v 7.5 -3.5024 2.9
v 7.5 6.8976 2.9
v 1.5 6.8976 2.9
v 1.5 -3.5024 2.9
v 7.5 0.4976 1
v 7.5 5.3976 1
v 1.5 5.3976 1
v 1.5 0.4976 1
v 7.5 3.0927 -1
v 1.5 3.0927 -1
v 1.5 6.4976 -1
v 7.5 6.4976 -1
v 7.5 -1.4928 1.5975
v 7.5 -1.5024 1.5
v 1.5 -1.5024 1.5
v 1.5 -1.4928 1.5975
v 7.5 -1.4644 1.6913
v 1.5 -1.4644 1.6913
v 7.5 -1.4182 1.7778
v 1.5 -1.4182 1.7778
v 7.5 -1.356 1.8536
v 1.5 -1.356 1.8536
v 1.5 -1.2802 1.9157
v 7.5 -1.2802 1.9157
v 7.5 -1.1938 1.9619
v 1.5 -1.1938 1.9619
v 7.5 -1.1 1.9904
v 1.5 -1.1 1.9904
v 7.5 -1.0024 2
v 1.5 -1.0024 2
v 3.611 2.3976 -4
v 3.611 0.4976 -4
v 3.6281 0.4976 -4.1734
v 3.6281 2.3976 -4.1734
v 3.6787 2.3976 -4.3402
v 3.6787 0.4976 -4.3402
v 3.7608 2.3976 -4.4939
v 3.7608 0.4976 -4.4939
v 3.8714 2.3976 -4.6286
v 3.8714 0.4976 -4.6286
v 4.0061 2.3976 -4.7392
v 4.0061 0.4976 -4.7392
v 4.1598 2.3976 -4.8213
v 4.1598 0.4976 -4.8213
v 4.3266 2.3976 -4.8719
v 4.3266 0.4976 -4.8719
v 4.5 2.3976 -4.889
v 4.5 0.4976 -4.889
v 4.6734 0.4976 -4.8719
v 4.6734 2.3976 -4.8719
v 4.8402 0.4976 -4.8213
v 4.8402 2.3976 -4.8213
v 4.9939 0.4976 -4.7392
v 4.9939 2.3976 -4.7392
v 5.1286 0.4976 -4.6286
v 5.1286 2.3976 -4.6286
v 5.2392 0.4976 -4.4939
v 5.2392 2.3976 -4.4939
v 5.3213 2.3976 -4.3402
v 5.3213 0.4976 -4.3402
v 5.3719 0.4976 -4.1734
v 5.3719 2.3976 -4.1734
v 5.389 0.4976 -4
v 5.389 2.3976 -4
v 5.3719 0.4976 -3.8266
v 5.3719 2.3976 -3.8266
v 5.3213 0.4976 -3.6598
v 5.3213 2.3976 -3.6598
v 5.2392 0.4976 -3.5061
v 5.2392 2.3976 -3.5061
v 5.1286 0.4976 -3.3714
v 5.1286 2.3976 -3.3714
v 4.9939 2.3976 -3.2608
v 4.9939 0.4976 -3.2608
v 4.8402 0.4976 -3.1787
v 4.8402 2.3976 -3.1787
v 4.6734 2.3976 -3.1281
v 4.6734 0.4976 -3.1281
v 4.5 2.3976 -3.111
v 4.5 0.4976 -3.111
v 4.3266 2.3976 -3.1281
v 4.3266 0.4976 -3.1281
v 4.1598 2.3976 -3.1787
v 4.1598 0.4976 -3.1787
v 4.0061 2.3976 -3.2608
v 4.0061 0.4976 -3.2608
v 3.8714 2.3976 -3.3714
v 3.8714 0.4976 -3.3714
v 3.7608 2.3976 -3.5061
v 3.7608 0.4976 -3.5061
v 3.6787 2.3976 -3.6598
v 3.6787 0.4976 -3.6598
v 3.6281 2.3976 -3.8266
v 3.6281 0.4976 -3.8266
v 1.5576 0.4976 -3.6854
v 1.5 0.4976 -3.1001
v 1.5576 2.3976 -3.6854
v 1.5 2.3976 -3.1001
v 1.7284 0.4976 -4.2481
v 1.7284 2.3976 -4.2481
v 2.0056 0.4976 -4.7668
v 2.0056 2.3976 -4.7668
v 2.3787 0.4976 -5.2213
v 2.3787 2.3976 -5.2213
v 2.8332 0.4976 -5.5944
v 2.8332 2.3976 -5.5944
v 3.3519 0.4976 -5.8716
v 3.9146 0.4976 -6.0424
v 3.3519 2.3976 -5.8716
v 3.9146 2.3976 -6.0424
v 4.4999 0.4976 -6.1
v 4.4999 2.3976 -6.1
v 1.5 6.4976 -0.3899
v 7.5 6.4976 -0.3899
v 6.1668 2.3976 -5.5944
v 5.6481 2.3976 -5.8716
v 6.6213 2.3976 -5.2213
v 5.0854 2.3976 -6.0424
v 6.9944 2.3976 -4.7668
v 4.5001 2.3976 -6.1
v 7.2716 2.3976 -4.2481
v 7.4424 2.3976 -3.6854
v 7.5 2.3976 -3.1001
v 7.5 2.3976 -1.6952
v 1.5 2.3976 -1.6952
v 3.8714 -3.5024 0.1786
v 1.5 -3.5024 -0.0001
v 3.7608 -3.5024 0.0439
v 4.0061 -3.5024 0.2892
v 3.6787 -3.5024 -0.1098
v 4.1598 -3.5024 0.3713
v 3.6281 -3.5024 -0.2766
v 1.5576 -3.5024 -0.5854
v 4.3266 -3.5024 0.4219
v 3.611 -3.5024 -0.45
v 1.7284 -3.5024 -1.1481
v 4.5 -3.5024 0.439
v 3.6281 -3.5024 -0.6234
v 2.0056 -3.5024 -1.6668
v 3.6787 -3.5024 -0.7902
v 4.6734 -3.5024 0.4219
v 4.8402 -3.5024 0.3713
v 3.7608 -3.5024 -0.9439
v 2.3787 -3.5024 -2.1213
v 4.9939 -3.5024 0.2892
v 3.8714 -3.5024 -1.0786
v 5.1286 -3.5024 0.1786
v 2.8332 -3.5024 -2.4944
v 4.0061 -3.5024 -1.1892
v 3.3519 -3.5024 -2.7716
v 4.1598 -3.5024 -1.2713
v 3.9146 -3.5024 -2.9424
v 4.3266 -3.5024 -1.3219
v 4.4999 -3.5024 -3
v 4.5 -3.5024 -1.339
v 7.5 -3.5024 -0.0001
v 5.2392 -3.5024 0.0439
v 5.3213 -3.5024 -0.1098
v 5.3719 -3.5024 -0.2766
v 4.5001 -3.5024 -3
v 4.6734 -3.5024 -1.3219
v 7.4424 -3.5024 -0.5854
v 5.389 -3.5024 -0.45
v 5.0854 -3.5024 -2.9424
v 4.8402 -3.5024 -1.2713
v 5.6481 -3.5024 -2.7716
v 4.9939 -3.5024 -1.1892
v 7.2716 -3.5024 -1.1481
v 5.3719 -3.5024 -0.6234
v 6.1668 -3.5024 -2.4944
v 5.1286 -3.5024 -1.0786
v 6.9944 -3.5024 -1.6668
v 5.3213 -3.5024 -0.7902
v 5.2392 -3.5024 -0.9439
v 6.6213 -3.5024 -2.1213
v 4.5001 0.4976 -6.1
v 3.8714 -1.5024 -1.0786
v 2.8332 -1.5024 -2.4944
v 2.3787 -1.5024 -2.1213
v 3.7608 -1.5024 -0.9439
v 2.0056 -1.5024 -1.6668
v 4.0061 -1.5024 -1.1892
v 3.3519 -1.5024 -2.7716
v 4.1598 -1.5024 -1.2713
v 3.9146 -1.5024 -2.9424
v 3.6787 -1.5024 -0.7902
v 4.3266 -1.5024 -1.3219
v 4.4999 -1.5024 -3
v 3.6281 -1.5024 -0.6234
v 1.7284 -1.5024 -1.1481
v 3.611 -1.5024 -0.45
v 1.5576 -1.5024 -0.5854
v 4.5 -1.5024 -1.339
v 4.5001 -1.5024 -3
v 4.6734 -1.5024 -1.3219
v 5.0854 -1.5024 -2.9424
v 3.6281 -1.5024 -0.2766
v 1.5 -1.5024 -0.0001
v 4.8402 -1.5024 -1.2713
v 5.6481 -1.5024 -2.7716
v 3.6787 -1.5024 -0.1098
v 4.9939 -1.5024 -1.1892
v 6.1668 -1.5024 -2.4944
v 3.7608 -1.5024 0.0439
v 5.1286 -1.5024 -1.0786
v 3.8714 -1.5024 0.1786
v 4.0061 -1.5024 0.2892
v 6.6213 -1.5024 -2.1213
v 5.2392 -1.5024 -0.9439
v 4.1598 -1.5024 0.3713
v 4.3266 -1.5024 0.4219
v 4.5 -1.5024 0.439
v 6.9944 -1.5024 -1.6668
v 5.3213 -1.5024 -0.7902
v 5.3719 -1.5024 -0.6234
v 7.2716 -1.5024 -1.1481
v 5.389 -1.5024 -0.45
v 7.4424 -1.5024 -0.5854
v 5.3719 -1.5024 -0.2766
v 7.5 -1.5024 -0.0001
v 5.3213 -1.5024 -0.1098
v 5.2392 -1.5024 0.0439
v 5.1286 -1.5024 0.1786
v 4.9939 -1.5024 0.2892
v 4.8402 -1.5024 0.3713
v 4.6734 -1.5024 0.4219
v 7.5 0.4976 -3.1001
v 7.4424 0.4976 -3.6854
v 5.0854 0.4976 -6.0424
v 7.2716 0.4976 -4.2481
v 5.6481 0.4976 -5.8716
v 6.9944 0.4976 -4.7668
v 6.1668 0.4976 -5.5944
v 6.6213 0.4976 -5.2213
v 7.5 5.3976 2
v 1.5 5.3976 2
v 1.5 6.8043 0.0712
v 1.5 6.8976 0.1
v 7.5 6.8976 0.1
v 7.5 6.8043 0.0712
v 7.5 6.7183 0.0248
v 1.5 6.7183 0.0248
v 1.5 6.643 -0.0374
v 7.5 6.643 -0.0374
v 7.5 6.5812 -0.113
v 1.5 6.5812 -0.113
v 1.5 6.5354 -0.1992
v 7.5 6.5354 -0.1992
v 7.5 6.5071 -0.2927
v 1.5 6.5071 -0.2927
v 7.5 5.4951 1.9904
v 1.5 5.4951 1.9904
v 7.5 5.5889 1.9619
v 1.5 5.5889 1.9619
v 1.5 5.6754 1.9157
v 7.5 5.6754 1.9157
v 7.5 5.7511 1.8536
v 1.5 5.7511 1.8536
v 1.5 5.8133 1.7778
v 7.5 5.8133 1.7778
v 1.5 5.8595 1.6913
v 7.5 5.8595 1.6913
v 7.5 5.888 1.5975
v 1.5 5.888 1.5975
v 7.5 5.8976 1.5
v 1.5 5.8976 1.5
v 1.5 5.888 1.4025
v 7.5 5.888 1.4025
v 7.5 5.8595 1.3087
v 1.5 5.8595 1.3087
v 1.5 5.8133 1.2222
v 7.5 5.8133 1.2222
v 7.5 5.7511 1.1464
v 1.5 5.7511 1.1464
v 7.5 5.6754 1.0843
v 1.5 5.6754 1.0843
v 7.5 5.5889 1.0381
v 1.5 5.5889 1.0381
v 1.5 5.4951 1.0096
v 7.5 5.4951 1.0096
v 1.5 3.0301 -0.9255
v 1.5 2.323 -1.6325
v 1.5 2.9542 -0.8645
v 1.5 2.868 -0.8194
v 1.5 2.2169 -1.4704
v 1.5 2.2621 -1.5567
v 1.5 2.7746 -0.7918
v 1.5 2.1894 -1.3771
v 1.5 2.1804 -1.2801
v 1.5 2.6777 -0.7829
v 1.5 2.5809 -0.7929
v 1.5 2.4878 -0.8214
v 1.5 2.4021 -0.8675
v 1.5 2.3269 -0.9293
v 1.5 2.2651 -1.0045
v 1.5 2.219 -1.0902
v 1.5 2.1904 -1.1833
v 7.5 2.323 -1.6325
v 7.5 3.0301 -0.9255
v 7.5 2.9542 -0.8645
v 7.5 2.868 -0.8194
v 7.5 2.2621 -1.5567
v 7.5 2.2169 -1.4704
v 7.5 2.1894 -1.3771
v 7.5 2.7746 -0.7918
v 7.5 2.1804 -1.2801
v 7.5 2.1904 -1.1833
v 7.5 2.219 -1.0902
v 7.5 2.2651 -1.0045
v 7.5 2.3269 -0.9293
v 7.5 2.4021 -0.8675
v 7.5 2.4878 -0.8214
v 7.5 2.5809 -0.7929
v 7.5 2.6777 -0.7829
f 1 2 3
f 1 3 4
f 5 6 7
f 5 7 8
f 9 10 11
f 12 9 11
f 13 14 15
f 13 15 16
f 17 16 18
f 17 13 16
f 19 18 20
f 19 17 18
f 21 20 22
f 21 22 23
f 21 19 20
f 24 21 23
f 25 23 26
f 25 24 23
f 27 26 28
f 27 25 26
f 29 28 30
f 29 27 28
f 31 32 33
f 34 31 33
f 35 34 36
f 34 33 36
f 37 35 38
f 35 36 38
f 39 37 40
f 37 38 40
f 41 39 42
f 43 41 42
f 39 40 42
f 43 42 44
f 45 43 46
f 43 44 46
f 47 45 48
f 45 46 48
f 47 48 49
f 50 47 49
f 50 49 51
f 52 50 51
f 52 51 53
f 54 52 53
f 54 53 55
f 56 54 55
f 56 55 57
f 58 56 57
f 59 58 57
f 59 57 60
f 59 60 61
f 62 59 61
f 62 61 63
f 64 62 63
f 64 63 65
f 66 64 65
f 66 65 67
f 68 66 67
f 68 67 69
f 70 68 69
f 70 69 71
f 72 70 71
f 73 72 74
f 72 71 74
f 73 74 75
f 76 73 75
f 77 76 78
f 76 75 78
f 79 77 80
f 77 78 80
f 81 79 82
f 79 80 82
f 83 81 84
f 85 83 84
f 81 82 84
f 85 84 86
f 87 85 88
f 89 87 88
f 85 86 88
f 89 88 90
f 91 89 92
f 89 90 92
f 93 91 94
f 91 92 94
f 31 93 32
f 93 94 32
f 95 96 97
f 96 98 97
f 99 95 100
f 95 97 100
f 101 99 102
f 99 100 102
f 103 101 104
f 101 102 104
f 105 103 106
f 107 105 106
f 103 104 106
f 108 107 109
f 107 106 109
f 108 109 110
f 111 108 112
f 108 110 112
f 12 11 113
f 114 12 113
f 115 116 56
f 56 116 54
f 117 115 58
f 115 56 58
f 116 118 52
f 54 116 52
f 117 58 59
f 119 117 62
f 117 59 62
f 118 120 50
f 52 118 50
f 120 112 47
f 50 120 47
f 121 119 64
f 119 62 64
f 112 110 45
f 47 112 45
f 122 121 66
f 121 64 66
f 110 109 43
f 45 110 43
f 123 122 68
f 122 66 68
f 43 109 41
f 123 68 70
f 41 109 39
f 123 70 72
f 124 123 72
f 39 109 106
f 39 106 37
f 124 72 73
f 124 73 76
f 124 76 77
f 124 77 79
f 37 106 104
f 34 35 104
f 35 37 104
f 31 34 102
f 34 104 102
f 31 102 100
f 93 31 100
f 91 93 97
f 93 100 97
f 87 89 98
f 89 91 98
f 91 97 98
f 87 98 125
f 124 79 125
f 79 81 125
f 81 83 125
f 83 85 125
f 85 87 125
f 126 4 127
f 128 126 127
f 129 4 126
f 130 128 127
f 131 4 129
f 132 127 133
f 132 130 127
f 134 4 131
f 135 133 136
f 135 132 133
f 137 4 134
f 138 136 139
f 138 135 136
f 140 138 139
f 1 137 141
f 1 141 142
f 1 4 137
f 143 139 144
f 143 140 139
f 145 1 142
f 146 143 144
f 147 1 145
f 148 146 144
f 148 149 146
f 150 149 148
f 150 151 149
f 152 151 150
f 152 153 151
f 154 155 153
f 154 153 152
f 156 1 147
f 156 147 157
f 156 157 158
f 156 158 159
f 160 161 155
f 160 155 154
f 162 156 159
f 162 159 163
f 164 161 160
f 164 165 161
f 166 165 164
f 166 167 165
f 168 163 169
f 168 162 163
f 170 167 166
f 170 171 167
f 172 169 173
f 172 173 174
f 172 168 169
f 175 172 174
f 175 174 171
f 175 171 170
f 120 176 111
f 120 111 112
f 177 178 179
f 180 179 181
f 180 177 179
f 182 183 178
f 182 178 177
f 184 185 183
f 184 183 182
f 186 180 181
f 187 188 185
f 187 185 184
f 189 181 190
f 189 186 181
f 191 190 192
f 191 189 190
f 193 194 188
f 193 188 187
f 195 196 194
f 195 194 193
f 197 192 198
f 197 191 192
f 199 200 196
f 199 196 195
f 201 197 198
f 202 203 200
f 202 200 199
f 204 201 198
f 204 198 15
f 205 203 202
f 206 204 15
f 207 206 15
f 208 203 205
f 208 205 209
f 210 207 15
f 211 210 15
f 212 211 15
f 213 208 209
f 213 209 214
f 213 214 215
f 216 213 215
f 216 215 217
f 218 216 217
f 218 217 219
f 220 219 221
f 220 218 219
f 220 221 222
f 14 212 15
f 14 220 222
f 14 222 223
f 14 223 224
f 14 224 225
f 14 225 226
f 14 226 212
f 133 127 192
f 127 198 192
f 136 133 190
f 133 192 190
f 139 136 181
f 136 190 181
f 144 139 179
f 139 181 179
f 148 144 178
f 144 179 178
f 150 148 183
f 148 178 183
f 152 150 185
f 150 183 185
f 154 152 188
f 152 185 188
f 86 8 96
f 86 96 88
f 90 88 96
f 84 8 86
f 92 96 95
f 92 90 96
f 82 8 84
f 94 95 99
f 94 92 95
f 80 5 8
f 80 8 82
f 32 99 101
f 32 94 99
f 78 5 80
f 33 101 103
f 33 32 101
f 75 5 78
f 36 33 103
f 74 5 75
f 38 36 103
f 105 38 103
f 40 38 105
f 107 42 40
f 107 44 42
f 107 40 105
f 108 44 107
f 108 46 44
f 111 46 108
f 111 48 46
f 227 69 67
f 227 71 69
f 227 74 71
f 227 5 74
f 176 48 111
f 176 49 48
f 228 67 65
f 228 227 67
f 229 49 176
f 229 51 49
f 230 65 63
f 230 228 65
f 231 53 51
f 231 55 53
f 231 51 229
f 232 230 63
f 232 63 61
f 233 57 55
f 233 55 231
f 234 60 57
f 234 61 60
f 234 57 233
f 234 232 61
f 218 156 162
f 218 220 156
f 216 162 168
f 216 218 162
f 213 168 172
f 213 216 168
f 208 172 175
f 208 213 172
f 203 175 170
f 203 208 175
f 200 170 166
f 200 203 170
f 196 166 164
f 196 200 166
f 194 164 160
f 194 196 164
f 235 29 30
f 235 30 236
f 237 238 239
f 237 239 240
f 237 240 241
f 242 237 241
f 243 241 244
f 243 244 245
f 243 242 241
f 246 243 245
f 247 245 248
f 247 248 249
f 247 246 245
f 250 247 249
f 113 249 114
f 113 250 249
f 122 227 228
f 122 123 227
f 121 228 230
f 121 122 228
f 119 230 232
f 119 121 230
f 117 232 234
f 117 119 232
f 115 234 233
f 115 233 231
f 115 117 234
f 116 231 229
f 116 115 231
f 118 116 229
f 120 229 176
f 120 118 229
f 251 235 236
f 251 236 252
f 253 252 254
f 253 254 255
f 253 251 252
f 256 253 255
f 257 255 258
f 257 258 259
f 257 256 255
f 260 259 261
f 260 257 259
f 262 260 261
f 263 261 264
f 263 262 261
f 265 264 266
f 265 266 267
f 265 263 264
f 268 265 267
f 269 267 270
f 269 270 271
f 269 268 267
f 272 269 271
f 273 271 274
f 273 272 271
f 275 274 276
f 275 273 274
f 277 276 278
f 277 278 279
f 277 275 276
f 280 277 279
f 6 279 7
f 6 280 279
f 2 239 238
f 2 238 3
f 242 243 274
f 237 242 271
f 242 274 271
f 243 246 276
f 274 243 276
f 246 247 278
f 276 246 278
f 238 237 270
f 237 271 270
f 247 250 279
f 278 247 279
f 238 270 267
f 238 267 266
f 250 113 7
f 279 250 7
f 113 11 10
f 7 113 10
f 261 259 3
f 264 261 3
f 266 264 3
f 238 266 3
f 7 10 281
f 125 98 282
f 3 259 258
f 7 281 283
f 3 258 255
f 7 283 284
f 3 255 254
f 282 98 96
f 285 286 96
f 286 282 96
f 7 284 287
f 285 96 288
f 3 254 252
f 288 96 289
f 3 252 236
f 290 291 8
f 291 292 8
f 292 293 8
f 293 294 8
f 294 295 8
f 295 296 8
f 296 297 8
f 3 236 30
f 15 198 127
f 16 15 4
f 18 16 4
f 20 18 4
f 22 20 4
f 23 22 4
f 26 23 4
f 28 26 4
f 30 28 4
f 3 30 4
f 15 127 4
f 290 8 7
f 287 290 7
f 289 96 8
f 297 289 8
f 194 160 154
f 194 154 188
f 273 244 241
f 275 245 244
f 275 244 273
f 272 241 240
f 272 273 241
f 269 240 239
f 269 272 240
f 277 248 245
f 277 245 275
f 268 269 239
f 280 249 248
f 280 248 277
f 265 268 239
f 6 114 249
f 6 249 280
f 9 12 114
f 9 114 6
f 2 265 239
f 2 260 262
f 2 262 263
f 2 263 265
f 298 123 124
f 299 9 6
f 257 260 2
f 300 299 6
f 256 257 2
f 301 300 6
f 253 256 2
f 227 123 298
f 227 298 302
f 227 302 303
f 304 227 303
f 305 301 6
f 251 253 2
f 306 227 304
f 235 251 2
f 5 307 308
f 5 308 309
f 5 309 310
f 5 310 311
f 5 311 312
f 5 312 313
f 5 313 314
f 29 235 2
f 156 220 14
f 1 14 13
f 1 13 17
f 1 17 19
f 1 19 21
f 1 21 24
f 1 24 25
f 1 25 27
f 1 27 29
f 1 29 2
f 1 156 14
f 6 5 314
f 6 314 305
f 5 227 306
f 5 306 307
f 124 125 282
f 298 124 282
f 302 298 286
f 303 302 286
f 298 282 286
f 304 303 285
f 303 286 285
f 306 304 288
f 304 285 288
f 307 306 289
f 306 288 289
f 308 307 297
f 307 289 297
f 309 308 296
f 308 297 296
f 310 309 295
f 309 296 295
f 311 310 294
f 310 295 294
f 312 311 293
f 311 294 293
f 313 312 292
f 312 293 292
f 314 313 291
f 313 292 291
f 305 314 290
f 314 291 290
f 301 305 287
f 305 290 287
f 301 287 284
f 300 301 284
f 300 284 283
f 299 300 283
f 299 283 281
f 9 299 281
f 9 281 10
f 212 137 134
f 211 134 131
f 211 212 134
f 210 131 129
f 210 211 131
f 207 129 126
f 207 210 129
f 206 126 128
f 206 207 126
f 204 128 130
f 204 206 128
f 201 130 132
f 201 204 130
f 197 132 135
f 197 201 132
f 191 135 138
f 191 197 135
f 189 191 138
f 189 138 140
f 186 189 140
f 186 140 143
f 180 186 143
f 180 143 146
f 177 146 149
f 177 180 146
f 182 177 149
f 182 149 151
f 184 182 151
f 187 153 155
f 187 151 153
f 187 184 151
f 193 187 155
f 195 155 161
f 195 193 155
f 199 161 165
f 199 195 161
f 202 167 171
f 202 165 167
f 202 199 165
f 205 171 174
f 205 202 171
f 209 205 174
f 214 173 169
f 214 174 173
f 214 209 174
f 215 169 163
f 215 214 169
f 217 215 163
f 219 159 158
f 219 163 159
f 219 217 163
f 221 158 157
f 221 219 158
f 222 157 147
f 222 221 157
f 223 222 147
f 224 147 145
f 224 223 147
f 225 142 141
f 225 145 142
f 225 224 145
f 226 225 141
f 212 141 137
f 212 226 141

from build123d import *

# Parameters (mm, degrees)
BOSS_EXTRUDE1_DEPTH       = 6
SKETCH3_W                 = 7.6
SKETCH3_H                 = 16
CUT_EXTRUDE2_DEPTH        = 11.990294347
CUT_EXTRUDE3_DEPTH        = 11.990294347
FILLET2_R                 = 3
FILLET3_R                 = 0.5
F_2_56_TAPPED_HOLE1_D     = 1.778
F_2_56_TAPPED_HOLE1_DEPTH = 3
F_2_56_TAPPED_HOLE1_TIP   = 0.53416509
SKETCH13_R                = 0.5
CUT_EXTRUDE10_DEPTH       = 10


# Some blends are built 0.0001 mm under size
with BuildPart() as part:
    # Sketch1 → Boss-Extrude1 (new body)
    with BuildSketch(Plane(origin=(7.5, 0, 0), x_dir=(0, 0, -1), z_dir=(1, 0, 0))):
        with BuildLine():
            Line((-2, 0.497577099), (-2, 5.397577099))
            ThreePointArc((-2, 5.397577099), (-1.5, 5.897577099), (-1, 5.397577099))
            Line((-1, 5.397577099), (-1, 0.497577099))
            Line((-1, 0.497577099), (6.1, 0.497577099))
            Line((6.1, 0.497577099), (6.1, 6.897577099))
            Line((6.1, 6.897577099), (-2.9, 6.897577099))
            Line((-2.9, 6.897577099), (-2.9, -3.502422901))
            Line((-2.9, -3.502422901), (3, -3.502422901))
            Line((3, -3.502422901), (3, -1.502422901))
            Line((3, -1.502422901), (-2, -1.502422901))
            Line((-2, -1.502422901), (-2, 0.497577099))
        make_face()
    extrude(amount=-BOSS_EXTRUDE1_DEPTH)

    # Sketch3 → Cut-Extrude2 (cut, through all)
    with BuildSketch(Plane.ZY.offset(-1.5)):
        with Locations((6.8, 14.497577099)):
            Rectangle(SKETCH3_W, SKETCH3_H)
        with Locations((-3.7, 14.497577099)):
            Rectangle(SKETCH3_W, SKETCH3_H)
    extrude(amount=-CUT_EXTRUDE2_DEPTH, mode=Mode.SUBTRACT)

    # Sketch4 → Cut-Extrude3 (cut, through all)
    with BuildSketch(Plane.ZY.offset(-1.5)):
        Polygon((-1.707106781, 2.397577099), (-1, 2.397577099), (-1, 3.20468388), (-1, 6.497577099), (-7.5, 6.497577099), (-7.5, 2.397577099), align=None)
    extrude(amount=-CUT_EXTRUDE3_DEPTH, mode=Mode.SUBTRACT)

    # Fillet2
    fillet2_edges = [part.edges().sort_by_distance(p)[0] for p in [
        (7.5, 1.447577099, -6.1),
        (1.5, 1.447577099, -6.1),
        (7.5, -2.502422901, -3),
        (1.5, -2.502422901, -3),
    ]]
    fillet(fillet2_edges, radius=FILLET2_R - 0.0001)  # a hair under: the kernel refuses the full size

    # Fillet3
    # the kernel refuses this fillet: 0.5 mm, written as the material it adds along each edge
    with BuildSketch(Plane(origin=(1.5, 6.497577099, 0.1), x_dir=(0, 1.0, -1.570583940679385e-12), z_dir=(1, 0, 0))) as fillet3_piece_1:
        with BuildLine():
            CenterArc((0.5, -0.489897949), FILLET3_R, 101.536959033, 78.463040967)
            Line((0, -0.489897949), (-0.01, -0.489897949))
            Line((-0.01, -0.489897949), (-0.01, 0))
            Line((-0.01, 0), (0, 0.01))
            ThreePointArc((0, 0.01), (0.2, 0.01), (0.398, 0.009797959))
            Line((0.398, 0.009797959), (0.4, 0))
        make_face()
    extrude(amount=6)
    with BuildSketch(Plane(origin=(7.5, -1.502422901, 2), x_dir=(0, 0, -1), z_dir=(-1, 0, 0))) as fillet3_piece_2:
        with BuildLine():
            CenterArc((FILLET3_R, -FILLET3_R), FILLET3_R, 90, 90)
            Line((0, -FILLET3_R), (-FILLET3_R * 0.02, -FILLET3_R))
            Line((-FILLET3_R * 0.02, -FILLET3_R), (-FILLET3_R * 0.02, FILLET3_R * 0.02))
            Line((-FILLET3_R * 0.02, FILLET3_R * 0.02), (FILLET3_R, FILLET3_R * 0.02))
            Line((FILLET3_R, FILLET3_R * 0.02), (FILLET3_R, 0))
        make_face()
    extrude(amount=6)

    # #2-56 Tapped Hole1
    with Locations(Plane(origin=(0, 2.397577099, 0), x_dir=(1, 0, 0), z_dir=(0, 1, 0))):
        with Locations((4.5, 4)):
            Hole(F_2_56_TAPPED_HOLE1_D / 2, depth=F_2_56_TAPPED_HOLE1_DEPTH)
            with Locations((0, 0, -(F_2_56_TAPPED_HOLE1_DEPTH + F_2_56_TAPPED_HOLE1_TIP / 2))):  # 118° drill point
                Cone(0, F_2_56_TAPPED_HOLE1_D / 2, F_2_56_TAPPED_HOLE1_TIP, mode=Mode.SUBTRACT)

    # Sketch12 → #2-56 Tapped Hole2 (revolve, cut)
    with BuildSketch(Plane(origin=(4.5, -1.502422901, -0.45), x_dir=(0, 0, 1), z_dir=(1, 0, 0))):
        Polygon((0, 0), (0, 5.87416509), (0.889, 5.34), (0.889, 0), align=None)
    revolve(axis=Axis((4.5, 4.847577099, -0.45), (0, -1, 0)), mode=Mode.SUBTRACT)

    # Sketch13 → Cut-Extrude10 (cut)
    with BuildSketch(Plane.ZY.offset(-1.5)):
        with Locations((-1.282842712, 2.680419811)):
            Circle(SKETCH13_R)
    extrude(amount=-CUT_EXTRUDE10_DEPTH, mode=Mode.SUBTRACT)


solid = part.part
